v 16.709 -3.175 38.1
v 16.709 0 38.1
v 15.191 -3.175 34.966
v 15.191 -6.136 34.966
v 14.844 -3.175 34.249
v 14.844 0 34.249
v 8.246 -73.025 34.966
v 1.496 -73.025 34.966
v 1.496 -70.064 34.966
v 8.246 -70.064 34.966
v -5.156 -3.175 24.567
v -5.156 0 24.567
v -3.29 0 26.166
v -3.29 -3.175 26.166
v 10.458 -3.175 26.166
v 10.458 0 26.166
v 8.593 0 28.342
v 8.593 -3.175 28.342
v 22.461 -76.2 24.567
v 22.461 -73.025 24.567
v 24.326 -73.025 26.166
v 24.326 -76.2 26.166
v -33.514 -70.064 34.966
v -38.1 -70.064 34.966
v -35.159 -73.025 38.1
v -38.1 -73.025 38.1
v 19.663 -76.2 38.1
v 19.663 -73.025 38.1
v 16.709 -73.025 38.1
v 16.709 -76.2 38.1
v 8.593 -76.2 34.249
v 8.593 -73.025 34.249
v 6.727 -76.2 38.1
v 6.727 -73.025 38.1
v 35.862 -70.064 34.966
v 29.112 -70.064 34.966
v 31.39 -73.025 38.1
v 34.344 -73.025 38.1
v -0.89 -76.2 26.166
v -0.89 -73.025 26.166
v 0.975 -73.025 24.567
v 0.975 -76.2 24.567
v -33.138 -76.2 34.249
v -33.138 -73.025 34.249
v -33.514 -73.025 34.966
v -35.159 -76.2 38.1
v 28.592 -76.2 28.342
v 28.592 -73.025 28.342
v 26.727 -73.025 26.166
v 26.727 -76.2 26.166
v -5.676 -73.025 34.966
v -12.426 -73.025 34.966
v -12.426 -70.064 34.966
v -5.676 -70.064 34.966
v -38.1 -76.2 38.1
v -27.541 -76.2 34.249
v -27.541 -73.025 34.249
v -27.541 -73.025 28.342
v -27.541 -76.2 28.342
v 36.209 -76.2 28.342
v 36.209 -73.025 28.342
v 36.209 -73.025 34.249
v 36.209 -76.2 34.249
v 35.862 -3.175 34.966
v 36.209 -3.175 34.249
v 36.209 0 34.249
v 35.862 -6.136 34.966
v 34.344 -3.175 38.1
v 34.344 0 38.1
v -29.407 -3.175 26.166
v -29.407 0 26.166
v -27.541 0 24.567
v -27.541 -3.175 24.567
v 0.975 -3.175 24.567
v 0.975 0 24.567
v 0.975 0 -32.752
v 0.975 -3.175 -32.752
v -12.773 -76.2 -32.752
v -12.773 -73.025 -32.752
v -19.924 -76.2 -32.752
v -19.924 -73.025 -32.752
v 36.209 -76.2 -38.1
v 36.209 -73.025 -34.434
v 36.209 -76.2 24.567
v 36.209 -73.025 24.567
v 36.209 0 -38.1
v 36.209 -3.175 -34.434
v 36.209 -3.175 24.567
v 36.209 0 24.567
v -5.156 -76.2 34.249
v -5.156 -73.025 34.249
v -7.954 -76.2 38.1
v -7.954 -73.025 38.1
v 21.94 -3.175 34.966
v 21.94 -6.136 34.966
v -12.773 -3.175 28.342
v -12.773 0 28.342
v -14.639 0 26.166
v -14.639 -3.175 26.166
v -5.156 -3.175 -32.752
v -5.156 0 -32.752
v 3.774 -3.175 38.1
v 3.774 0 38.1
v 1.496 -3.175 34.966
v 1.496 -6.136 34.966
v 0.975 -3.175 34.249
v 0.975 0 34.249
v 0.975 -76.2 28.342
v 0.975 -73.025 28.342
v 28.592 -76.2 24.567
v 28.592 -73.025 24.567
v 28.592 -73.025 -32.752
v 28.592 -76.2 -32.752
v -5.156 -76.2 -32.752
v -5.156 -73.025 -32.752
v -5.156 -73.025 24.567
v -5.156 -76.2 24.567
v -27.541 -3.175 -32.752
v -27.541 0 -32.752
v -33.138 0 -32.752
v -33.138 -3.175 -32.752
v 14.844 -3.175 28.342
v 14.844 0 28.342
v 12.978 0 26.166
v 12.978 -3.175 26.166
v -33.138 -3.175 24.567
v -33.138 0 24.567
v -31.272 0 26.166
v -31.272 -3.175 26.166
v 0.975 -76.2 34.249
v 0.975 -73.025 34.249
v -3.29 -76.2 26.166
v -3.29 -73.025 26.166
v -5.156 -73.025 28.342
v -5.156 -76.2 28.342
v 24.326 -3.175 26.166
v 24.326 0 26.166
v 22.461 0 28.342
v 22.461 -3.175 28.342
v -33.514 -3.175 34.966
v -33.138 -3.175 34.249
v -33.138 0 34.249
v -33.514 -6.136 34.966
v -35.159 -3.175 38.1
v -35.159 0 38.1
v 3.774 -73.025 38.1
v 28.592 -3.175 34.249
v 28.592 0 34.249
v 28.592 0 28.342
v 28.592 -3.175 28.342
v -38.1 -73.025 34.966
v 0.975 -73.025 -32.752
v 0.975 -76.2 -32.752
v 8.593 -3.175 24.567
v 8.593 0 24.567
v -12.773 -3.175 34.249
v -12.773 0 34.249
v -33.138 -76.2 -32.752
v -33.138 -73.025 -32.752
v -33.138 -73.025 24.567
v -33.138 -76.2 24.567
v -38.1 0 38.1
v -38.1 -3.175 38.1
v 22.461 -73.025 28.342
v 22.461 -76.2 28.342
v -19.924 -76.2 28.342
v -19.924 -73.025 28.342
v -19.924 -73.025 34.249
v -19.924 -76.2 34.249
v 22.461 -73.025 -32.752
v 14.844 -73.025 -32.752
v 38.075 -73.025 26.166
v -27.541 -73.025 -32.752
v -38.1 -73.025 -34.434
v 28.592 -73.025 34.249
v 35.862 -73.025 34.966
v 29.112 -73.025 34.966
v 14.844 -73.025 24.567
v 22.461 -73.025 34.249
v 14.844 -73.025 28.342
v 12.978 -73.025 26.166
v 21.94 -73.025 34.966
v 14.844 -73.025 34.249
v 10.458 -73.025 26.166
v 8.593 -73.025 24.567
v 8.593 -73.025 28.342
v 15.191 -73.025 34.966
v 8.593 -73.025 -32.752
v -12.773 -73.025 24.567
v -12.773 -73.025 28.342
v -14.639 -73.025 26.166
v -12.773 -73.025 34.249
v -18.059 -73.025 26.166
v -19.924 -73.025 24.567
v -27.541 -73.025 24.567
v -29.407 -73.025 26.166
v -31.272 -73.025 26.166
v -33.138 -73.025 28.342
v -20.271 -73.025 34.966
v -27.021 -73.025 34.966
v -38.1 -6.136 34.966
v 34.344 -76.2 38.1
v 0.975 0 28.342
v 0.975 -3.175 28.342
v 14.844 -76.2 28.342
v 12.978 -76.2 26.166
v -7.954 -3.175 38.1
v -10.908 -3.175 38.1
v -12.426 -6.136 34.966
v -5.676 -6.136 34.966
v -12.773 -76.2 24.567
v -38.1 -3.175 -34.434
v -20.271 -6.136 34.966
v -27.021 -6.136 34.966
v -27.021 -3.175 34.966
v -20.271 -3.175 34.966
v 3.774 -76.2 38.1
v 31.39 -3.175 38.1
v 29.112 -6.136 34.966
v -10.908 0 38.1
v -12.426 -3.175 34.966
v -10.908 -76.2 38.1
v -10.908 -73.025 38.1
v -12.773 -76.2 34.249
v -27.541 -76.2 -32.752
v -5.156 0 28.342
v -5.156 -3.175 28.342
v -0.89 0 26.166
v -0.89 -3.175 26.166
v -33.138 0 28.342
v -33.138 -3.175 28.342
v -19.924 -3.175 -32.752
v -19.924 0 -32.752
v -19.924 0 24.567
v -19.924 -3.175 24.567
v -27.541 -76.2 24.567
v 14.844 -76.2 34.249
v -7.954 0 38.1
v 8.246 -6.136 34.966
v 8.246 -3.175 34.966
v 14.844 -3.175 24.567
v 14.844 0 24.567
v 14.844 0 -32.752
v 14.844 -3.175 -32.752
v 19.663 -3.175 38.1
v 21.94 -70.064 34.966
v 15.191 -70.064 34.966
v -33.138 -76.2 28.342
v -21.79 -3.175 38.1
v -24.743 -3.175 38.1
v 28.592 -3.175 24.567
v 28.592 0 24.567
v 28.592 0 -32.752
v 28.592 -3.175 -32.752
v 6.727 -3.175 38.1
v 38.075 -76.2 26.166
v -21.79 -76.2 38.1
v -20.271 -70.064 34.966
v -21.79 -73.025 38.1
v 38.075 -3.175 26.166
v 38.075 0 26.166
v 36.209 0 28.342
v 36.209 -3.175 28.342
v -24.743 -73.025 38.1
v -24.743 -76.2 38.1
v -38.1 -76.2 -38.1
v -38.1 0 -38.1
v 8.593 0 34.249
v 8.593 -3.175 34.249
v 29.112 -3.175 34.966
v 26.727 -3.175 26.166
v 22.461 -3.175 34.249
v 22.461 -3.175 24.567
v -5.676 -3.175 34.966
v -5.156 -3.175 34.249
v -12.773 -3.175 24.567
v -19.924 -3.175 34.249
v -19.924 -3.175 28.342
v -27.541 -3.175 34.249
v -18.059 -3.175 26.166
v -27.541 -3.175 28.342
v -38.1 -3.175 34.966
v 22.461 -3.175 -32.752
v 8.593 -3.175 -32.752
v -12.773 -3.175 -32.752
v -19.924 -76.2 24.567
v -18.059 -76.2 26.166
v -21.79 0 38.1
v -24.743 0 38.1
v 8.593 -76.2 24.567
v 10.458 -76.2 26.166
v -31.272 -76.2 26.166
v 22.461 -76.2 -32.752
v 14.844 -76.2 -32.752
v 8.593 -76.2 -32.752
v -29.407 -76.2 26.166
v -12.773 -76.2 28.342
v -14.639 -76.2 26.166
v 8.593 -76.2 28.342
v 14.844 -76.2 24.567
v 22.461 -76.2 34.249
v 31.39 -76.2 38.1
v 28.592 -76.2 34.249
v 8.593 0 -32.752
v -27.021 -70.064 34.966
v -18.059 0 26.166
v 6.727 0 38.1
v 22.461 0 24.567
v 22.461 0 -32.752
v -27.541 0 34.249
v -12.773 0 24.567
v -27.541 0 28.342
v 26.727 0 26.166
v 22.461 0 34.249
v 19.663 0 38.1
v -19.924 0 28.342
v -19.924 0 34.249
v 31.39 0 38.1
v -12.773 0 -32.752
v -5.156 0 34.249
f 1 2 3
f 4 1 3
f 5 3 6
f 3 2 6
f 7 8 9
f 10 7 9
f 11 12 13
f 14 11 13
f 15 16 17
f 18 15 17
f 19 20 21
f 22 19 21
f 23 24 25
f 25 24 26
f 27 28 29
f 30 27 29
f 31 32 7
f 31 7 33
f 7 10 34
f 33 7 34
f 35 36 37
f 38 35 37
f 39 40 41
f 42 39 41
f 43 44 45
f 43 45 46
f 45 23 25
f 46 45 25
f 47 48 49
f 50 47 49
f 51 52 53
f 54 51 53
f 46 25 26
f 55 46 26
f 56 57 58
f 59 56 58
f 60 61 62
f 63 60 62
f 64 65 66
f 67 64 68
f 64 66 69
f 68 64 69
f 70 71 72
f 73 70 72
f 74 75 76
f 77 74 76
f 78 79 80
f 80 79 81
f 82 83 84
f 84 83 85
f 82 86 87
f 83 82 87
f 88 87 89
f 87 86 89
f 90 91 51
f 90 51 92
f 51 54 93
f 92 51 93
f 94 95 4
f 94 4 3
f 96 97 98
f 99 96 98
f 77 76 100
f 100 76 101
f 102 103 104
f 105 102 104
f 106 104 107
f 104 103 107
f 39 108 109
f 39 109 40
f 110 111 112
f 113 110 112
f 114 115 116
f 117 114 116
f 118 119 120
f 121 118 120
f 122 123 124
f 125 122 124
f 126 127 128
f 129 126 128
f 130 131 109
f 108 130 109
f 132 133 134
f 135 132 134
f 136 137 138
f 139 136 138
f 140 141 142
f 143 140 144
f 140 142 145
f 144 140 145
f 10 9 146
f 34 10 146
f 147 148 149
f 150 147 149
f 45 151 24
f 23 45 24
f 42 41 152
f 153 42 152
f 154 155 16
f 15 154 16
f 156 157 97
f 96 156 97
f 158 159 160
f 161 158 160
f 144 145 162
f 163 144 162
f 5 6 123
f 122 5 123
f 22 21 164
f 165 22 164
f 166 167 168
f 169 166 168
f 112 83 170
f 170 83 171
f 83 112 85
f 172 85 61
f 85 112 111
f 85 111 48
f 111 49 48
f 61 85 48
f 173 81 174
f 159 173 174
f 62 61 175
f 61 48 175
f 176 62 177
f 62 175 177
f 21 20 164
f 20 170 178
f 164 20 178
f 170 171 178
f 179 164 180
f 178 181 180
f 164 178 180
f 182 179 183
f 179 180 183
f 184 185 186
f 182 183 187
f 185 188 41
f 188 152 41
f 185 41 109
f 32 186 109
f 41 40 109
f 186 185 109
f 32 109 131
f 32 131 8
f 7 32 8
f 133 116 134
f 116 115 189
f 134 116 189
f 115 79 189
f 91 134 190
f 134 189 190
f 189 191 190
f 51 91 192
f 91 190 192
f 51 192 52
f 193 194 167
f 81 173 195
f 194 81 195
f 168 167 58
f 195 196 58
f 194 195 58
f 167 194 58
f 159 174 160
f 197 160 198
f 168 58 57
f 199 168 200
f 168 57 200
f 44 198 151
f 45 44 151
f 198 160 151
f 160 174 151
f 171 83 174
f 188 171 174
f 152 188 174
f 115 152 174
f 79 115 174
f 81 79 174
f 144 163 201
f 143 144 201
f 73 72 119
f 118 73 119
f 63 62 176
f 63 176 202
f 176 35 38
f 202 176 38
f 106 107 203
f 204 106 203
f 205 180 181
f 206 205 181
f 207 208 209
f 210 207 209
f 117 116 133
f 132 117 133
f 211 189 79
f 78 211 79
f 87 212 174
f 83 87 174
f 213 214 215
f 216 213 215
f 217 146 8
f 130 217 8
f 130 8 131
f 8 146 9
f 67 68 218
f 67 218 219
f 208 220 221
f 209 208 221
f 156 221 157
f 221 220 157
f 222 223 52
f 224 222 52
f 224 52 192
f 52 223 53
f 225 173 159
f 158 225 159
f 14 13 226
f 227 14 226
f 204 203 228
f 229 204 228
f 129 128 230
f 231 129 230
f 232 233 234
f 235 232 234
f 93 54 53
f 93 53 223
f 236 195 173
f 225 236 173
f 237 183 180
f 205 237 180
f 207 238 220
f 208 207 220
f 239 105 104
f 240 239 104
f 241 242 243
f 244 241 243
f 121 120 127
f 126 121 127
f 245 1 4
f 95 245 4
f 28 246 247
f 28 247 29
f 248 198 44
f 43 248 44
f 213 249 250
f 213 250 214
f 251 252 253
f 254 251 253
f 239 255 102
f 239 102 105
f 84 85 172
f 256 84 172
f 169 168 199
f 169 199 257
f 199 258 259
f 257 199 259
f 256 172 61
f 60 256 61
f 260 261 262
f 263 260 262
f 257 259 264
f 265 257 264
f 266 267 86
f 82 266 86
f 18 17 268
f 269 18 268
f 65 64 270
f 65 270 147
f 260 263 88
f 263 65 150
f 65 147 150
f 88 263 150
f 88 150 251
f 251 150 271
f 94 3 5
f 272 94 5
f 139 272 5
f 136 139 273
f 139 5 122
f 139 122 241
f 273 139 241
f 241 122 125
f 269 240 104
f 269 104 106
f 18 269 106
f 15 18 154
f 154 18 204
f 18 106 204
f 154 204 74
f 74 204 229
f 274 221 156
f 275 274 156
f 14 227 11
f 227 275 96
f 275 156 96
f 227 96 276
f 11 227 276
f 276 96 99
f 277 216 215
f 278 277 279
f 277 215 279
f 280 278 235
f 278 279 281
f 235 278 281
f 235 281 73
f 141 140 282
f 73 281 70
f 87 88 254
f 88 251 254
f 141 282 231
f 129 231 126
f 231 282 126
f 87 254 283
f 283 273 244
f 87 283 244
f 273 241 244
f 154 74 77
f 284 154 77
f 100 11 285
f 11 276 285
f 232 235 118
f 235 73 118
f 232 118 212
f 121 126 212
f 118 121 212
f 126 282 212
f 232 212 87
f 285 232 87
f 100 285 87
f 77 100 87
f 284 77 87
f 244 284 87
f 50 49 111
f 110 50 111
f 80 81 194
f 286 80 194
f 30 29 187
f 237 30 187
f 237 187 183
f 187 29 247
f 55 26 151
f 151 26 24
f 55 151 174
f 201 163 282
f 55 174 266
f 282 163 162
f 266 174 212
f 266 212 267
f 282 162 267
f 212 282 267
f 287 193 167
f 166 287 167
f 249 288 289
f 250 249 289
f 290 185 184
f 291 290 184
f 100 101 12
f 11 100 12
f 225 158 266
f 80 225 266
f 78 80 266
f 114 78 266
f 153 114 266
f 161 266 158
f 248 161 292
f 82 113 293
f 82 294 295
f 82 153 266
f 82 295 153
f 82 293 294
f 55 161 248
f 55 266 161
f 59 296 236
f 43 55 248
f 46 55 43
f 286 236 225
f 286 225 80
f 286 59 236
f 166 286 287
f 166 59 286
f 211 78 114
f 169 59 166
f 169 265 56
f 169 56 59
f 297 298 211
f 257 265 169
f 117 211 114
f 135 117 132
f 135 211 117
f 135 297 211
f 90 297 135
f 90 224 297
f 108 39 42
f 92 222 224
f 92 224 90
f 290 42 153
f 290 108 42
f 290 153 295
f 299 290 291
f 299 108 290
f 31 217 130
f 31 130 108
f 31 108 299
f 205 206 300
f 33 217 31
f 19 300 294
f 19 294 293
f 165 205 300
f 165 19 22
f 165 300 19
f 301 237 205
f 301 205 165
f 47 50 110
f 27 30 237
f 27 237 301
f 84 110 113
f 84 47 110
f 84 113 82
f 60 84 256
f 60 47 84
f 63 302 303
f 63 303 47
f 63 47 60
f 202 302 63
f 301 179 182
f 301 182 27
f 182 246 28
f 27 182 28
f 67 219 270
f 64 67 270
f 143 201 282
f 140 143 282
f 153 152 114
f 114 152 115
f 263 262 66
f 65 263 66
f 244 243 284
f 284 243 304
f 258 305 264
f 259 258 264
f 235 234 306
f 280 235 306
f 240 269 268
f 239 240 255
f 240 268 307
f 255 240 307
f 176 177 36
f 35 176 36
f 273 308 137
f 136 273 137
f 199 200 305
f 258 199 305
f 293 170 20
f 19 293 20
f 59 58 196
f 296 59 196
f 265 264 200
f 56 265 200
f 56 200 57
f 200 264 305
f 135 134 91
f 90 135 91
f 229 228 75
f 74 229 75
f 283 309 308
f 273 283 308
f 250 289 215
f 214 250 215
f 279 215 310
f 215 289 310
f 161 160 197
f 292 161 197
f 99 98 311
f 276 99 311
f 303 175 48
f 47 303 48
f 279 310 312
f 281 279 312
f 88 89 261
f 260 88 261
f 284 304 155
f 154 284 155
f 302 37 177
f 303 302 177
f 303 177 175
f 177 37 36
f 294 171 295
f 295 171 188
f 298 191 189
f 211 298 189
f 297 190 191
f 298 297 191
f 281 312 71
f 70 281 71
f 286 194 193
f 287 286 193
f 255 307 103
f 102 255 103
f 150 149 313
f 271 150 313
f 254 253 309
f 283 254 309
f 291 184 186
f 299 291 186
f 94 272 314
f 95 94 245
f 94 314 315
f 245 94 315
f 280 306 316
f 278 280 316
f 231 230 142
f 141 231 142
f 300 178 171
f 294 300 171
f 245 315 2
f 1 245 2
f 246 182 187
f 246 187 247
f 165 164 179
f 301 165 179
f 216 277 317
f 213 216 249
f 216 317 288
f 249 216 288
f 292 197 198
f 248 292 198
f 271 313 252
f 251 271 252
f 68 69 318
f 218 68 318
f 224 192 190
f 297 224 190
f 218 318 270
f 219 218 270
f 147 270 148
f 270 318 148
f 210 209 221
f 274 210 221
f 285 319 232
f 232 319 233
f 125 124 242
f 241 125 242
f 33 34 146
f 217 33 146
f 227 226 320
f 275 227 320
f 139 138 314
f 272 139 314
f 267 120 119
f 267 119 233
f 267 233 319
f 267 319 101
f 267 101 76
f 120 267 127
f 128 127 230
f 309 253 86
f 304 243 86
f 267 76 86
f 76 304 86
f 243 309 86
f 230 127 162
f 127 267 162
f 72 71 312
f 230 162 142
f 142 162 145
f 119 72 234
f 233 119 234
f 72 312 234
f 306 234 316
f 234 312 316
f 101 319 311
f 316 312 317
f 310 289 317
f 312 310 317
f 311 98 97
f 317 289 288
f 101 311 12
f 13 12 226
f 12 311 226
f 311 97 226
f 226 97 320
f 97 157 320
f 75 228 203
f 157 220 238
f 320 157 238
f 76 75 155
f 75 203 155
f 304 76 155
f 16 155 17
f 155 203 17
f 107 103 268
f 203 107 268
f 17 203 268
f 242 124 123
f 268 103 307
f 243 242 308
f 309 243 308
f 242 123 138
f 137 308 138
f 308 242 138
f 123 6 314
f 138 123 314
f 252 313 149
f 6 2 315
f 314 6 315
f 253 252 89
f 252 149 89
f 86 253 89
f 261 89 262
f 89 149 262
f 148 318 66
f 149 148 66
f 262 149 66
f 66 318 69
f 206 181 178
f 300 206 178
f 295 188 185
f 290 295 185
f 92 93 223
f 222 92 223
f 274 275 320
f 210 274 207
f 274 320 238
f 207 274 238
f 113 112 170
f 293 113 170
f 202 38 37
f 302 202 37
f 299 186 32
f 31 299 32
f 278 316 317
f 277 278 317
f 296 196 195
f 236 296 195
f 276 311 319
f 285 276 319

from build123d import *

# Parameters (mm, degrees)
F1_DEPTH = 76.2
F3_DEPTH = 76.175829


with BuildPart() as f1:
    # F0 (on Front) → F1 (new body)
    with BuildSketch(Plane.XZ):
        Polygon((-35.158783, 38.1), (-38.1, 38.1), (-38.1, -32.752417), (-33.137847, -32.752417), (-33.137847, 24.566615), (-31.27237, 26.165593), (-33.137847, 28.341984), (-33.137847, 34.249332), align=None)
        Polygon((-33.137847, -32.752417), (-38.1, -32.752417), (-38.1, -38.1), (36.209352, -38.1), (36.209352, -32.752417), (28.591979, -32.752417), (22.460993, -32.752417), (14.84362, -32.752417), (8.592682, -32.752417), (0.975309, -32.752417), (-5.155675, -32.752417), (-12.773048, -32.752417), (-19.924045, -32.752417), (-27.541418, -32.752417), align=None)
        Polygon((-27.541418, 24.566615), (-27.541418, -32.752417), (-19.924045, -32.752417), (-19.924045, 24.566615), (-18.058568, 26.165593), (-19.924045, 28.341984), (-19.924045, 34.249332), (-21.789523, 38.1), (-24.743196, 38.1), (-27.541414, 34.249332), (-27.541414, 28.341984), (-29.406892, 26.165593), align=None)
        Polygon((28.591979, -32.752417), (36.209352, -32.752417), (36.209352, 24.566615), (38.074829, 26.165593), (36.209352, 28.341984), (36.209352, 34.249332), (34.343874, 38.1), (31.390201, 38.1), (28.591983, 34.249332), (28.591983, 28.341984), (26.726505, 26.165593), (28.591979, 24.566615), align=None)
        Polygon((-12.773048, 24.566615), (-12.773048, -32.752417), (-5.155675, -32.752417), (-5.155675, 24.566615), (-3.290201, 26.165593), (-5.155679, 28.341984), (-5.155679, 34.249332), (-7.953897, 38.1), (-10.90757, 38.1), (-12.773048, 34.249332), (-12.773048, 28.341984), (-14.638525, 26.165593), align=None)
        Polygon((14.84362, -32.752417), (22.460993, -32.752417), (22.460993, 24.566615), (24.326468, 26.165593), (22.46099, 28.341984), (22.46099, 34.249332), (19.662771, 38.1), (16.709099, 38.1), (14.84362, 34.249332), (14.84362, 28.341984), (12.978144, 26.165593), (14.84362, 24.566615), align=None)
        Polygon((0.975309, 24.566615), (0.975309, -32.752417), (8.592682, -32.752417), (8.592682, 24.566615), (10.458158, 26.165593), (8.592682, 28.341984), (8.592682, 34.249332), (6.727204, 38.1), (3.773531, 38.1), (0.975313, 34.249332), (0.975313, 28.341984), (-0.890166, 26.165593), align=None)
    extrude(amount=F1_DEPTH)

    # F2 (on face) → F3 (cut, through all)
    with BuildSketch(Plane(origin=(-38.1, 0, 0), x_dir=(0, -1, 0), z_dir=(-1, 0, 0))):
        Polygon((73.025, 38.1), (3.175, 38.1), (6.136249, 34.965612), (3.175, 34.965612), (3.175, -34.434266), (73.025, -34.434266), (73.025, 34.965612), (70.063751, 34.965612), align=None)
    extrude(amount=-F3_DEPTH, mode=Mode.SUBTRACT)


solid = f1.part
